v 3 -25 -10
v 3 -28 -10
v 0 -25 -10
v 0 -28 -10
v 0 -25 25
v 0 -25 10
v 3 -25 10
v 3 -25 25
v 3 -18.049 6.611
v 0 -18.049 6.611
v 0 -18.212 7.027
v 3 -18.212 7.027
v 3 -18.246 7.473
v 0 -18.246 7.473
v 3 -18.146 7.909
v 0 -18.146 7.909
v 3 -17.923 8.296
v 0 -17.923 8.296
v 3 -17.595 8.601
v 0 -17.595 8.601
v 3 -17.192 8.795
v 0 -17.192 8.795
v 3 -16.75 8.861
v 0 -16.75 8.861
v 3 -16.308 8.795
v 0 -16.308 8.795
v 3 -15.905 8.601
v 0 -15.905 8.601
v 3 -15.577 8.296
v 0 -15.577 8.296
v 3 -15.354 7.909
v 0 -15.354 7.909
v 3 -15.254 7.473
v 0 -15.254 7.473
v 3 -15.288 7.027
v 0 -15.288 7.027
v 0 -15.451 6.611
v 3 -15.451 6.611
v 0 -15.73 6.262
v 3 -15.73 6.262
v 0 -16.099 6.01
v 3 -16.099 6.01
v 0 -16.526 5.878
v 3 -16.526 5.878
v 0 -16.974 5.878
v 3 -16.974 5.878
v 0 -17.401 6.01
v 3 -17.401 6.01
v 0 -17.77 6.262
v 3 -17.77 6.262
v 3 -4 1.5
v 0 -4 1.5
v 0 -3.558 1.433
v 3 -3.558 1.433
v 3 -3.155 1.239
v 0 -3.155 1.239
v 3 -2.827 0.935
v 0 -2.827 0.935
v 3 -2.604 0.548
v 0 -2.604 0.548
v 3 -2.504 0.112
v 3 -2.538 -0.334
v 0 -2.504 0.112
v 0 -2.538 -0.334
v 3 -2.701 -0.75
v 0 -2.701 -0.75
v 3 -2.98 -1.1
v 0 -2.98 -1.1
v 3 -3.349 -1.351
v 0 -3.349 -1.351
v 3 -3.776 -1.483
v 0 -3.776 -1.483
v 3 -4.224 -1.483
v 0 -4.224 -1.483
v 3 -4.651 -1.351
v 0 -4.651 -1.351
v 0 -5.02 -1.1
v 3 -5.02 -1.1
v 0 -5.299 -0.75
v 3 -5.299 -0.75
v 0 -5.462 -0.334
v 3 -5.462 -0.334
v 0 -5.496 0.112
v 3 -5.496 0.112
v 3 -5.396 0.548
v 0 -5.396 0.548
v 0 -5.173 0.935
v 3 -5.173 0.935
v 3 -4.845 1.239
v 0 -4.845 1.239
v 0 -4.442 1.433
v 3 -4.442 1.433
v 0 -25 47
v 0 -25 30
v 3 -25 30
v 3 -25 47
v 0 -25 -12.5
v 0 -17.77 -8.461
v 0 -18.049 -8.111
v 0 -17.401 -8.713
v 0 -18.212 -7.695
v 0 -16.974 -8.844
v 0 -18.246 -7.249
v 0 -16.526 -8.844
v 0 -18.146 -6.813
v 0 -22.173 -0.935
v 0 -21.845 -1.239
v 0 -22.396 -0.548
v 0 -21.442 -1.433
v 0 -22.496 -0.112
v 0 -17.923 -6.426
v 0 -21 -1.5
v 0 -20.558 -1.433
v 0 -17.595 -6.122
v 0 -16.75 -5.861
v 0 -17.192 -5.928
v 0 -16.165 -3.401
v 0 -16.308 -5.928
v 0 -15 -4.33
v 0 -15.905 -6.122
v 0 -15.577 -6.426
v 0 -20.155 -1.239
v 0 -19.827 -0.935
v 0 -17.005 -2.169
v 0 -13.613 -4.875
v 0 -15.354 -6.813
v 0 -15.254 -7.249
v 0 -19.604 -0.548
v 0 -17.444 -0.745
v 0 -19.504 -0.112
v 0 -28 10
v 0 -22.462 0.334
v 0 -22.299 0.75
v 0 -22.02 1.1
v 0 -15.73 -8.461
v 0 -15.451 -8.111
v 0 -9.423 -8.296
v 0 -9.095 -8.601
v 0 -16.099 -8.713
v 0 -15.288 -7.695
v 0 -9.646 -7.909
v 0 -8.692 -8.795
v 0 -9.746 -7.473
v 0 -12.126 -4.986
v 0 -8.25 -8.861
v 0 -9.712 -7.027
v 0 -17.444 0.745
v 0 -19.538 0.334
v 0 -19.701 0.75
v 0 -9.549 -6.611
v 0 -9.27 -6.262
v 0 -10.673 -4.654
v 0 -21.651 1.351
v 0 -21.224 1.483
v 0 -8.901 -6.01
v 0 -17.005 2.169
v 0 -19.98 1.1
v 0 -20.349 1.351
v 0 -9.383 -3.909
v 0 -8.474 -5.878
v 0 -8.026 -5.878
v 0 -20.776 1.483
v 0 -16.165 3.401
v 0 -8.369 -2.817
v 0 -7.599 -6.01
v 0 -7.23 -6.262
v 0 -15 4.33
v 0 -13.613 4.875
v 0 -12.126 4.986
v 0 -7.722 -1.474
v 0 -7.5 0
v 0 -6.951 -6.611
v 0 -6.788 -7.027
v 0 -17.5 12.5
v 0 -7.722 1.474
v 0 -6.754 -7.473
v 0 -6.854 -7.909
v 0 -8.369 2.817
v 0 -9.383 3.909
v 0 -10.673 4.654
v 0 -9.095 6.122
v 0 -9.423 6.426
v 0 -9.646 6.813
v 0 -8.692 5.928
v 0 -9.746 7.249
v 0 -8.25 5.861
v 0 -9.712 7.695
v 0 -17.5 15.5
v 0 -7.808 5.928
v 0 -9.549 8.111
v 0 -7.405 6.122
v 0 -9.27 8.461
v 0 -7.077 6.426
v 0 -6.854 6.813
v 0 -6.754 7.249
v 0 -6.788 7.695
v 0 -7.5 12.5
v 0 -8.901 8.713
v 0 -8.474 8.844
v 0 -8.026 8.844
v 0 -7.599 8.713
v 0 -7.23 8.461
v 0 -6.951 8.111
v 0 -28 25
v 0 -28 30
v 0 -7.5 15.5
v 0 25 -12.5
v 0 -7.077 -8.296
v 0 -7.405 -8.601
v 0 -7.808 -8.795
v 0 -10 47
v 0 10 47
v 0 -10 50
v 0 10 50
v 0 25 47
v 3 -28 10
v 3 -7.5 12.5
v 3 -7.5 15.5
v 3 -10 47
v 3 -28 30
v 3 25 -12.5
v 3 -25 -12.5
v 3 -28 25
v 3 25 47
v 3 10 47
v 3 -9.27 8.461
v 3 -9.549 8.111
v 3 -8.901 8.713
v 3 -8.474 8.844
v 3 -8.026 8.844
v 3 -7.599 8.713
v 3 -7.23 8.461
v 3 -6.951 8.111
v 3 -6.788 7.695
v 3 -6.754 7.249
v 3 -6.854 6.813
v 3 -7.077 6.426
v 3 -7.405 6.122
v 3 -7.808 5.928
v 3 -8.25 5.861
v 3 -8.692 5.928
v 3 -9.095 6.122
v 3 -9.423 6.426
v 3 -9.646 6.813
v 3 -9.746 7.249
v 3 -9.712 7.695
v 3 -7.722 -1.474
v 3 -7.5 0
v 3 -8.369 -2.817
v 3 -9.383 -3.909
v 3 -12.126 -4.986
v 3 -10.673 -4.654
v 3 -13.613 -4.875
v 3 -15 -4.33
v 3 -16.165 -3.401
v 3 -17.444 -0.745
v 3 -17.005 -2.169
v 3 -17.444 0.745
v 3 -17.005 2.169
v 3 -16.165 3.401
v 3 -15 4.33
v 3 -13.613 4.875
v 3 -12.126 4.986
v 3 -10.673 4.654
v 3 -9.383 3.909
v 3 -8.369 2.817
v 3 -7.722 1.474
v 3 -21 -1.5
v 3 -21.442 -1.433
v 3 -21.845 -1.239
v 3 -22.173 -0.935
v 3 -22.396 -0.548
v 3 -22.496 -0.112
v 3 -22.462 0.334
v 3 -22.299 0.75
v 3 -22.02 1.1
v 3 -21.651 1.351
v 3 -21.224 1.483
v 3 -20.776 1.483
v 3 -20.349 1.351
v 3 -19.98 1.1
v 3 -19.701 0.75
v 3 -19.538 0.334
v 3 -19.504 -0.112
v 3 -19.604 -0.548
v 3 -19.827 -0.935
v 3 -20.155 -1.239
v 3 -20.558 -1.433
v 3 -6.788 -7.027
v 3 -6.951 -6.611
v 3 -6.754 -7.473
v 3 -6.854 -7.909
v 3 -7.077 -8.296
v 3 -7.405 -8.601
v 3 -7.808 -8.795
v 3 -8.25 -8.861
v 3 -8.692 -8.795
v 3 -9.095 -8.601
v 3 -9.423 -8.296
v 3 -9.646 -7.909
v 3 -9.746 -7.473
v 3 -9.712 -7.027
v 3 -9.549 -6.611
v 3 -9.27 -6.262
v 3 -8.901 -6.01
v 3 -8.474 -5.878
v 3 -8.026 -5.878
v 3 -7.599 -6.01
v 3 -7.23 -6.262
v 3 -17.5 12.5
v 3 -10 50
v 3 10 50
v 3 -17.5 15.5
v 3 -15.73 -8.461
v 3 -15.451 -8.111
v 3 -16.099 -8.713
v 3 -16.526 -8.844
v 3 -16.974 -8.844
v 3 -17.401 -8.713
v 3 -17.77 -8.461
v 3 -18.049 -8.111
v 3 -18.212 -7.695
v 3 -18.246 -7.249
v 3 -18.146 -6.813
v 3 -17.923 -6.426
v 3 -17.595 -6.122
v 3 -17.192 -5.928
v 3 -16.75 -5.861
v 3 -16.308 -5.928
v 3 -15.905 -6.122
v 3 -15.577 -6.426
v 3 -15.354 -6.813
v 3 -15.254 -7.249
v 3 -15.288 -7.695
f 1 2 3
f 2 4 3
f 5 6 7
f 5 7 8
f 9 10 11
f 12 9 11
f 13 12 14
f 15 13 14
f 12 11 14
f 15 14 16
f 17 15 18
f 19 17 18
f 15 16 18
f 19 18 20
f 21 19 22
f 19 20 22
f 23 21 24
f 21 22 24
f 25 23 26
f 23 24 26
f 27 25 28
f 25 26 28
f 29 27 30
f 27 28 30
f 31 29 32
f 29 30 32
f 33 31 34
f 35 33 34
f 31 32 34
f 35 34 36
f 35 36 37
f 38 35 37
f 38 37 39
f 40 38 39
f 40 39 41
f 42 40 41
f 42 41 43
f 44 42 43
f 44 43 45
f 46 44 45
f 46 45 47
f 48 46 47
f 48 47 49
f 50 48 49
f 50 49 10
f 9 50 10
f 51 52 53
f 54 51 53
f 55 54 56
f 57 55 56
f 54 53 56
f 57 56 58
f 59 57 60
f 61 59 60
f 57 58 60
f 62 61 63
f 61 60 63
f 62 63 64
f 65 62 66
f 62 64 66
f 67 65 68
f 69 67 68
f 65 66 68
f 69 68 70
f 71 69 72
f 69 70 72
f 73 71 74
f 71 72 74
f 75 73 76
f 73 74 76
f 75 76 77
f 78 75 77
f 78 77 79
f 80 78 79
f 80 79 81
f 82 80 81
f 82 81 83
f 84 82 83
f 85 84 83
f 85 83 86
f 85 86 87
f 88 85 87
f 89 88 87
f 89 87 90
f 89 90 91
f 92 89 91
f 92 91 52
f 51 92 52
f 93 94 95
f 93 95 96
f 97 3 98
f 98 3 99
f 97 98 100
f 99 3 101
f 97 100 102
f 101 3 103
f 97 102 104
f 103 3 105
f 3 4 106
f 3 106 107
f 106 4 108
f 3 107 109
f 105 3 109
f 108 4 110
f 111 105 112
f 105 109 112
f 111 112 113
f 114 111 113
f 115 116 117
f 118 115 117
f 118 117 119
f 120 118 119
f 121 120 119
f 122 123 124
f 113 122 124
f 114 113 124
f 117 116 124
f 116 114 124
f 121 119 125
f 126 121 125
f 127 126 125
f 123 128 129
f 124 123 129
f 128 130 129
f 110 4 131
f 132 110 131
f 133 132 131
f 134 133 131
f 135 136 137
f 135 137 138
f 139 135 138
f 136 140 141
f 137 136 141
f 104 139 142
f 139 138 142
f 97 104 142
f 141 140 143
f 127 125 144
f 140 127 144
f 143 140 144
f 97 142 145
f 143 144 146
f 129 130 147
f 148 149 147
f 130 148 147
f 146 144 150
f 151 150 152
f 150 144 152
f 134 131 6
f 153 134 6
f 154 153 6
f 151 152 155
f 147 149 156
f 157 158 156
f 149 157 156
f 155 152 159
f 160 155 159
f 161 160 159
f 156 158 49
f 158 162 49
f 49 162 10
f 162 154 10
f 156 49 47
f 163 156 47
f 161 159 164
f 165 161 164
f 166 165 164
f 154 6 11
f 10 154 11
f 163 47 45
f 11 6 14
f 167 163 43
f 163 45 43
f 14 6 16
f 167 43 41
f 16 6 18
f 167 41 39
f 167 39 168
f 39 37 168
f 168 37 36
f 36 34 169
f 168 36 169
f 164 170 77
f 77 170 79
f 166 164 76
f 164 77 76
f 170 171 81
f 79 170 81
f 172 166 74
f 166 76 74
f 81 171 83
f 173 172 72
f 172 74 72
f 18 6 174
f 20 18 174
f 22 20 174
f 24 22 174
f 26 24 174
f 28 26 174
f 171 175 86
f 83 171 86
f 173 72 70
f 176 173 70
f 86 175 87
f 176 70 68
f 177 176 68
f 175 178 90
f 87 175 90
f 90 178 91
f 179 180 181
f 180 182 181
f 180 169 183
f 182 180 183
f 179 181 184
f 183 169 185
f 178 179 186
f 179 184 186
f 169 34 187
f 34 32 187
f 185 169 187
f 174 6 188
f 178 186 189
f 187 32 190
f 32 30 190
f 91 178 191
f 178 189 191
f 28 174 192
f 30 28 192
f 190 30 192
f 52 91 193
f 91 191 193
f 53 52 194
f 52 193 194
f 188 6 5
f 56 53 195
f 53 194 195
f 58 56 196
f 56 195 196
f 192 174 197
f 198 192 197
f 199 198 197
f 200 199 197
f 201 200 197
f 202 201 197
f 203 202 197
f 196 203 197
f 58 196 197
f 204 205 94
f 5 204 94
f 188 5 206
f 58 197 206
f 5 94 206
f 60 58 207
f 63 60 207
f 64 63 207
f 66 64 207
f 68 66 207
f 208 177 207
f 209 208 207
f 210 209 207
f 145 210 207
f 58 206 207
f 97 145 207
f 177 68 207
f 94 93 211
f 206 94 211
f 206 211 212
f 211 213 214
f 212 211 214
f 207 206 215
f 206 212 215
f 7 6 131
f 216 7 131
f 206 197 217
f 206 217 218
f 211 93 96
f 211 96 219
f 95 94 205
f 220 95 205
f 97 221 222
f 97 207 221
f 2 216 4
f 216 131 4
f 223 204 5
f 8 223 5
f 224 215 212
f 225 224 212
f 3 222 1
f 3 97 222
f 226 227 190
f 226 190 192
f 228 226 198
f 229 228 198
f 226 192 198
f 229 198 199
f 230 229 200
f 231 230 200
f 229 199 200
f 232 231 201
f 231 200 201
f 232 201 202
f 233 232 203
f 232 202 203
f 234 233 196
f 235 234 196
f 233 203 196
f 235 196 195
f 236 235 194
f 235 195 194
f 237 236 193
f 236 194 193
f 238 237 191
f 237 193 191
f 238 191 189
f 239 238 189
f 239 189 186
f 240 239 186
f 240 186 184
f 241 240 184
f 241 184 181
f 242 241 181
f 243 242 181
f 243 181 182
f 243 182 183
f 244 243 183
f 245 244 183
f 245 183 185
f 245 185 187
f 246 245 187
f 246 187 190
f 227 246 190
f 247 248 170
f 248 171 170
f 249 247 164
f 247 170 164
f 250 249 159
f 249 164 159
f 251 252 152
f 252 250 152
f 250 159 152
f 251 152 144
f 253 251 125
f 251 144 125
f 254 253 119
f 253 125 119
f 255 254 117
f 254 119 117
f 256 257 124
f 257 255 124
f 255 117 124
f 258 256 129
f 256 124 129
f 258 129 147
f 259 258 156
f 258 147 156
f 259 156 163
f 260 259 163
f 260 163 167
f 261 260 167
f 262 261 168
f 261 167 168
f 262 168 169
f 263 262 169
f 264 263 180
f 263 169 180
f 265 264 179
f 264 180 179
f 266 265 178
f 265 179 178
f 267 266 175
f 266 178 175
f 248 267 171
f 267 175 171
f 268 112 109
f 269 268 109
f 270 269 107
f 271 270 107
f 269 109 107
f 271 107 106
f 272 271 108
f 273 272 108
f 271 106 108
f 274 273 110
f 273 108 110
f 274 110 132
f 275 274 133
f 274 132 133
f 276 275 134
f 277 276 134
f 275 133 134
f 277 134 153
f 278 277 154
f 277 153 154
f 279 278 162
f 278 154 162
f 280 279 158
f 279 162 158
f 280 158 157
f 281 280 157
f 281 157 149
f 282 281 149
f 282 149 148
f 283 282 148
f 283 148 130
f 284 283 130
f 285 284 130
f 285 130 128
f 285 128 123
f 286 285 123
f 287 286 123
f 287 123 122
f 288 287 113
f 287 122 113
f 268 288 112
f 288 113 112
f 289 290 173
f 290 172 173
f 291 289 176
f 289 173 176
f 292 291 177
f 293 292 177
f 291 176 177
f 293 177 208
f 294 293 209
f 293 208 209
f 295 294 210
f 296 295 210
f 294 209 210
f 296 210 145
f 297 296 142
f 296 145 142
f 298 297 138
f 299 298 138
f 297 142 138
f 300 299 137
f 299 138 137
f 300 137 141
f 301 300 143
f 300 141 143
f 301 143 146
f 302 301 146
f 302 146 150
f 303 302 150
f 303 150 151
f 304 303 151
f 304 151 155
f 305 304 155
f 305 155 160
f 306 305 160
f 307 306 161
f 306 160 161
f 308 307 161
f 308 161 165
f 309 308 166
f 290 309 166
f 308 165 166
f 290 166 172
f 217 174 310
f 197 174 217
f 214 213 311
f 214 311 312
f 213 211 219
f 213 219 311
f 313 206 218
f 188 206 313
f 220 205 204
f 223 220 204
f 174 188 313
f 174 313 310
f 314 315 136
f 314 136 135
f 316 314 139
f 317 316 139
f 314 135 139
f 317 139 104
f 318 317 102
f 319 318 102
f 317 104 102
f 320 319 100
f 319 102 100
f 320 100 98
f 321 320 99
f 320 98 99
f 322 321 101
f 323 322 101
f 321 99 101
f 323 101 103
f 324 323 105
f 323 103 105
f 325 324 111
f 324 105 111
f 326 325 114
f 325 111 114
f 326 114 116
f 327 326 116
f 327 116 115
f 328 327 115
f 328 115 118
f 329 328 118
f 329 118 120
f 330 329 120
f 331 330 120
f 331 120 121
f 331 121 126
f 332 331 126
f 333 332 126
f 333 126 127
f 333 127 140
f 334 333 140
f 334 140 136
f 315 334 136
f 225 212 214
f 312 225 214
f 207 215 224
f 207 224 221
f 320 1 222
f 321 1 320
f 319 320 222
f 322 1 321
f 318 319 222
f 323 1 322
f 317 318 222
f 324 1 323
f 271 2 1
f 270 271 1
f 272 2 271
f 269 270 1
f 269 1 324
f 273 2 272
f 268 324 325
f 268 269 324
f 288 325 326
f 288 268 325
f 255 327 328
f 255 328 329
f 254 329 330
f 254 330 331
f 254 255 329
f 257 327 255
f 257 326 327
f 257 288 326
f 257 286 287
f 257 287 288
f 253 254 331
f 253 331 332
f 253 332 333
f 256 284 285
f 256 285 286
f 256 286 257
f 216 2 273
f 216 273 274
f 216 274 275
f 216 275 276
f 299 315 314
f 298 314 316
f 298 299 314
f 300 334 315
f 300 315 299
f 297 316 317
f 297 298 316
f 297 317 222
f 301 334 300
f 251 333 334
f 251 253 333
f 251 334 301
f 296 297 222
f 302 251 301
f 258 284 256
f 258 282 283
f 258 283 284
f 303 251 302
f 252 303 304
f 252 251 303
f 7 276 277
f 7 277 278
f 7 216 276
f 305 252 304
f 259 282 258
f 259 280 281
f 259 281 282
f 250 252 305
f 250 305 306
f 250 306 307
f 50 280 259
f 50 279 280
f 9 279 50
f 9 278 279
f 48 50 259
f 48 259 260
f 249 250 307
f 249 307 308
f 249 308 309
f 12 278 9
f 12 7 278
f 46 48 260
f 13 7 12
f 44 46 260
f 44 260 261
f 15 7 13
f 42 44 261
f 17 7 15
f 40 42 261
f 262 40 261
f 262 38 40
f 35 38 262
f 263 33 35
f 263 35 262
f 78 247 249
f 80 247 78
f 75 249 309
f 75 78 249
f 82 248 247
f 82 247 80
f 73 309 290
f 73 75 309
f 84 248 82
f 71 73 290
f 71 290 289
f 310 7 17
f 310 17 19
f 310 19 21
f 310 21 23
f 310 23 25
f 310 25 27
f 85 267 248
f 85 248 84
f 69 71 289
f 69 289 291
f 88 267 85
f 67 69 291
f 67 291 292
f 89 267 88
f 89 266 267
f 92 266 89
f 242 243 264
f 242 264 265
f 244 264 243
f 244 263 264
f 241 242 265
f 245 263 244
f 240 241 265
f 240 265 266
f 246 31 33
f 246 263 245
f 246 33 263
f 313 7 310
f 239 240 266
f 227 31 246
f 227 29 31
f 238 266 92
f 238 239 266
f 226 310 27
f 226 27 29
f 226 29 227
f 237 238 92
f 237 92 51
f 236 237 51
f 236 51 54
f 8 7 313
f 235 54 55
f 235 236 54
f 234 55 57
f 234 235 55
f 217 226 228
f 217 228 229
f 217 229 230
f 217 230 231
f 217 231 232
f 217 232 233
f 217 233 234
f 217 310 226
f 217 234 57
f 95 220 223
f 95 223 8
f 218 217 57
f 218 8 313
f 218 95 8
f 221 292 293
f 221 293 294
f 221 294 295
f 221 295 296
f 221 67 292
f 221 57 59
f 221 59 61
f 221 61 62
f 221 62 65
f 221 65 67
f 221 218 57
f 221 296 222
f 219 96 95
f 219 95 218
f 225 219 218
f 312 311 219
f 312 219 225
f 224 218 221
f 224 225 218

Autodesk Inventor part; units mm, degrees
ref_plane "YZ Plane" through (0, 0, 0) normal (1, 0, 0) x (0, 1, 0)
ref_plane "XZ Plane" through (0, 0, 0) normal (0, 1, 0) x (-1, 0, 0)
ref_plane "XY Plane" through (0, 0, 0) normal (0, 0, 1) x (1, 0, 0)
sketch "Sketch1" plane through (0, 0, 0) normal (1, 0, 0) x (0, 1, 0)
  line L0 (25, -12.5) -> (-25, -12.5)
  line L1 (-25, -12.5) -> (-25, 50)
  line L2 (-25, 50) -> (25, 50)
  line L3 (25, 50) -> (25, -12.5)
  circle A0 centre (-12.5, 0) radius 12.5 construction
  circle A1 centre (-12.5, 0) radius 5
  point P0 (0, 0)
  point P1 (0, -12.5)
  dimension "d0" = 50
  dimension "d1" = 50
  dimension "d2" = 25
  dimension "d3" = 12.5
  dimension "d4" = 10
extrude "Extrusion1" add sketch "Sketch1" along normal blind 3
sketch "Sketch2" plane through (0, 0, 0) normal (-1, 0, 0) x (0, 0, 1)
  line L0 (-10, -25) -> (10, -25)
  line L1 (10, -25) -> (10, -28)
  line L2 (10, -28) -> (-10, -28)
  line L3 (-10, -28) -> (-10, -25)
  line L4 (50, -25) -> (-12.5, -25) projected
  line L5 (25, -25) -> (30, -25)
  line L6 (30, -25) -> (30, -28)
  line L7 (30, -28) -> (25, -28)
  line L8 (25, -28) -> (25, -25)
  point P0 (0, 0)
  point P1 (0, -28)
  dimension "d7" = 20
  dimension "d8" = 3
  dimension "d9" = 5
  dimension "d10" = 3
  dimension "d11" = 15
extrude "Extrusion2" add sketch "Sketch2" against normal blind 3
sketch "Sketch3" plane through (0, 0, 0) normal (-1, 0, 0) x (0, 0, 1)
  line L0 (50, -25) -> (47, -25)
  line L1 (47, -25) -> (47, -10)
  line L2 (47, -10) -> (50, -10)
  line L3 (50, -10) -> (50, -25)
  line L4 (50, 25) -> (47, 25)
  line L5 (47, 25) -> (47, 10)
  line L6 (47, 10) -> (50, 10)
  line L7 (50, 10) -> (50, 25)
  point P0 (0, 0)
  dimension "d14" = 20
  dimension "d15" = 10
  dimension "d16" = 3
extrude "Extrusion3" cut sketch "Sketch3" against normal blind 3
sketch "Sketch4" plane through (0, 0, 0) normal (-1, 0, 0) x (0, 0, 1)
  circle A0 centre (0, -12.5) radius 5 projected
  circle A1 centre (0, -4) radius 1.5
  point P0 (0, 0)
  dimension "d19" = 3
  dimension "d20" = 8.5
extrude "Extrusion4" cut sketch "Sketch4" against normal blind 3 contours A1
pattern_circular "Circular Pattern1" count 6 over 360 about axis through (0, -12.5, 0) along (1, 0, 0) of "Extrusion4"
sketch "Sketch5" plane through (0, 0, 0) normal (-1, 0, 0) x (0, 0, 1)
  circle A0 centre (0, -12.5) radius 5 projected
  circle A1 centre (0, -12.5) radius 12.5 construction
  line L0 (12.5, -7.5) -> (15.5, -7.5)
  line L1 (15.5, -7.5) -> (15.5, -17.5)
  line L2 (15.5, -17.5) -> (12.5, -17.5)
  line L3 (12.5, -17.5) -> (12.5, -7.5)
  point P0 (0, 0)
  point P1 (12.5, -12.5)
  dimension "d26" = 25
  dimension "d27" = 3
  dimension "d28" = 10
extrude "Extrusion5" cut sketch "Sketch5" against normal blind 3 contours L0 L1 L2 L3
equation "\"d15\" = 0.5 * d14"
properties part number "Motor support"
